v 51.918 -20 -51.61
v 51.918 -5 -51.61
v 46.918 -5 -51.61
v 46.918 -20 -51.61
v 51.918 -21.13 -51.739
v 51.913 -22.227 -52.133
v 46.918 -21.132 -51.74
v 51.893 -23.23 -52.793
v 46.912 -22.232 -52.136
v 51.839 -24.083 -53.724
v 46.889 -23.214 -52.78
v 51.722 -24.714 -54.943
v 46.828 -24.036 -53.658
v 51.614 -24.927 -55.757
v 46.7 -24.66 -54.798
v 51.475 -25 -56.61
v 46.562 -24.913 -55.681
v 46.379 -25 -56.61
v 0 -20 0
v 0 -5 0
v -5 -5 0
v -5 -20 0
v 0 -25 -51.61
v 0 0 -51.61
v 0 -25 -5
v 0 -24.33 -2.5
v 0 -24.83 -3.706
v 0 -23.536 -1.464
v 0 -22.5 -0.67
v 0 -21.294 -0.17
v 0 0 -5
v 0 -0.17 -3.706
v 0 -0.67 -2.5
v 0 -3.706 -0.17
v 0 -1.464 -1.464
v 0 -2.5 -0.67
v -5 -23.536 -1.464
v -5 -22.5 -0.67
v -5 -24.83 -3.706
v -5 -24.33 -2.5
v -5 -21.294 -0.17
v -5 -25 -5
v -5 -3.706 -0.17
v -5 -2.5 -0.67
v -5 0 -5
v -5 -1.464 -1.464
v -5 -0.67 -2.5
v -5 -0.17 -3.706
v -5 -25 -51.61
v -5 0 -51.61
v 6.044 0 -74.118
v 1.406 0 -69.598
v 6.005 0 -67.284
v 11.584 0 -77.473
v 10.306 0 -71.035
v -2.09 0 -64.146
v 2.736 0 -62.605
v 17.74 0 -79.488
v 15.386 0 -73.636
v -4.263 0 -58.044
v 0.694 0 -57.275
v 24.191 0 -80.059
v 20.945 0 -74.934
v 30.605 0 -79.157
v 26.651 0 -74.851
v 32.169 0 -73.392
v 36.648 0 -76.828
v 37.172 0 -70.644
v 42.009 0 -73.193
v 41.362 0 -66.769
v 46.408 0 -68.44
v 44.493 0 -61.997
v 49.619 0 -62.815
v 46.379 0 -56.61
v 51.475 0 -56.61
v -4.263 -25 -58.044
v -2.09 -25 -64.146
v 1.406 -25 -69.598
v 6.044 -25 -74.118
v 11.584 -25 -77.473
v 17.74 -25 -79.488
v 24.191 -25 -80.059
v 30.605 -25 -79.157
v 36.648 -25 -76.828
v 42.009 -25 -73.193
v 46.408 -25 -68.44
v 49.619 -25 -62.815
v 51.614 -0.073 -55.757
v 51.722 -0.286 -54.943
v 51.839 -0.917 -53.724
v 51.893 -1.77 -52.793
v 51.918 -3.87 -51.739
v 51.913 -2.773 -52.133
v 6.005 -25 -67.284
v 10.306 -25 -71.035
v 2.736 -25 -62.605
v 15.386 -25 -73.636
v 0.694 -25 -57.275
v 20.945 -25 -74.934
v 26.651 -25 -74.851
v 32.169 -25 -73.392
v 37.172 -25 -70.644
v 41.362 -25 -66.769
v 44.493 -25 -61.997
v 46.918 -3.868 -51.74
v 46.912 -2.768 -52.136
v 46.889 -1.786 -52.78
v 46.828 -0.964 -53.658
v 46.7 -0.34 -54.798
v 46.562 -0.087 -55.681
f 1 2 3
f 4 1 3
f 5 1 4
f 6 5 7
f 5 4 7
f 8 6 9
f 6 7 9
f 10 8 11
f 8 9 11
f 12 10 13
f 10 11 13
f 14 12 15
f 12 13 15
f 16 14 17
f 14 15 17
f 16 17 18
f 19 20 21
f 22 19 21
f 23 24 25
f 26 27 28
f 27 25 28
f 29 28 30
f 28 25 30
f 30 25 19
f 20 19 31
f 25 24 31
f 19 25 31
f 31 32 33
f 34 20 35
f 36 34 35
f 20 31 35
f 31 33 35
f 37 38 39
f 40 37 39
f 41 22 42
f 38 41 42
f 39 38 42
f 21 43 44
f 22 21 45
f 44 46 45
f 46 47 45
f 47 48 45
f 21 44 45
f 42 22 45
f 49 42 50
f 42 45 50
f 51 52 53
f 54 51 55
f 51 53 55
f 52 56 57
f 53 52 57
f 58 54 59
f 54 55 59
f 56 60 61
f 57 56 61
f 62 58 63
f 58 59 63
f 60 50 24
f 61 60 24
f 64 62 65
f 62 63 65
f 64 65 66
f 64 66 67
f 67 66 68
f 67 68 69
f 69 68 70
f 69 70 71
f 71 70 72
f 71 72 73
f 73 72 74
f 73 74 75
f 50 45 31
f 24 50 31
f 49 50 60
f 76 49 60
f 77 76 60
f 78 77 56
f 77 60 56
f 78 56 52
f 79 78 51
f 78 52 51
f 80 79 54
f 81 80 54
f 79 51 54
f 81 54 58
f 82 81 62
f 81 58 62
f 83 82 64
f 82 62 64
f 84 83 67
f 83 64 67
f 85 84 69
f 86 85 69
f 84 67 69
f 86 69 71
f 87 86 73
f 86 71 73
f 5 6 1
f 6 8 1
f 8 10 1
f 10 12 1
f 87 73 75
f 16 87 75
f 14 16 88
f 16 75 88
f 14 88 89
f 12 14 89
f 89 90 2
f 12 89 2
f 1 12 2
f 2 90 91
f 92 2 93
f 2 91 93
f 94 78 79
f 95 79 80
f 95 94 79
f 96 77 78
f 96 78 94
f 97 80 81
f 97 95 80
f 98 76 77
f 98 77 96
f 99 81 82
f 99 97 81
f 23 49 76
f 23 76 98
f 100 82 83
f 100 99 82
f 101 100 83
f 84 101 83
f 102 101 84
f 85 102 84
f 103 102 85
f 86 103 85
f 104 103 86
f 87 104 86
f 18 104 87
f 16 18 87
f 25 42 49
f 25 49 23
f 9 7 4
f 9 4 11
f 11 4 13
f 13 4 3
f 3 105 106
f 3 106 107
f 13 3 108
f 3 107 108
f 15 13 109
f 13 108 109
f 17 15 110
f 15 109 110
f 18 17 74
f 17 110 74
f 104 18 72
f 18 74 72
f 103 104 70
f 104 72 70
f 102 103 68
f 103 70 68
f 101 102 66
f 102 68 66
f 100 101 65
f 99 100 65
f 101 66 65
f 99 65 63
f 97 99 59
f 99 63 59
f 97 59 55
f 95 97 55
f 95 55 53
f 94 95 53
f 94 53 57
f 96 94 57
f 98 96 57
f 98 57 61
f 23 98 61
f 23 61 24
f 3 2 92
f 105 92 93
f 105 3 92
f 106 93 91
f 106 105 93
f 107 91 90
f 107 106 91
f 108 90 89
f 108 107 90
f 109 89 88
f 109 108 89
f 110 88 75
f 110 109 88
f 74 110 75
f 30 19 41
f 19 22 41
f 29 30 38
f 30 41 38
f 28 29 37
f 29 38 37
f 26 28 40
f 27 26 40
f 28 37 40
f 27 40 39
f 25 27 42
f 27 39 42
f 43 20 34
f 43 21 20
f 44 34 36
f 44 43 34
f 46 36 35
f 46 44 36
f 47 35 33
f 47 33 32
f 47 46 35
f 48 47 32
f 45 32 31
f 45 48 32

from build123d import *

# Parameters (mm, degrees)
F1_DEPTH = 25
F2_R     = 5


with BuildPart() as f1:
    # F0 (on Front) → F1 (new body)
    with BuildSketch(Plane.XZ):
        with BuildLine():
            Line((0, -51.609781), (0, 0))
            Line((0, 0), (-5, 0))
            Line((-5, 0), (-5, -51.609781))
            ThreePointArc((-5, -51.609781), (23.458993, -80.068774), (51.917986, -51.609781))
            Line((51.917986, -51.609781), (46.917986, -51.609781))
            ThreePointArc((46.917986, -51.609781), (23.458993, -75.068774), (0, -51.609781))
        make_face()
    extrude(amount=F1_DEPTH)

    # F2
    f2_edges = [f1.edges().sort_by_distance(p)[0] for p in [
        (49.417986, -25, -51.609781),
        (49.417986, 0, -51.609781),
        (-2.5, 0, 0),
        (-2.5, -25, 0),
    ]]
    fillet(f2_edges, radius=F2_R)


solid = f1.part
